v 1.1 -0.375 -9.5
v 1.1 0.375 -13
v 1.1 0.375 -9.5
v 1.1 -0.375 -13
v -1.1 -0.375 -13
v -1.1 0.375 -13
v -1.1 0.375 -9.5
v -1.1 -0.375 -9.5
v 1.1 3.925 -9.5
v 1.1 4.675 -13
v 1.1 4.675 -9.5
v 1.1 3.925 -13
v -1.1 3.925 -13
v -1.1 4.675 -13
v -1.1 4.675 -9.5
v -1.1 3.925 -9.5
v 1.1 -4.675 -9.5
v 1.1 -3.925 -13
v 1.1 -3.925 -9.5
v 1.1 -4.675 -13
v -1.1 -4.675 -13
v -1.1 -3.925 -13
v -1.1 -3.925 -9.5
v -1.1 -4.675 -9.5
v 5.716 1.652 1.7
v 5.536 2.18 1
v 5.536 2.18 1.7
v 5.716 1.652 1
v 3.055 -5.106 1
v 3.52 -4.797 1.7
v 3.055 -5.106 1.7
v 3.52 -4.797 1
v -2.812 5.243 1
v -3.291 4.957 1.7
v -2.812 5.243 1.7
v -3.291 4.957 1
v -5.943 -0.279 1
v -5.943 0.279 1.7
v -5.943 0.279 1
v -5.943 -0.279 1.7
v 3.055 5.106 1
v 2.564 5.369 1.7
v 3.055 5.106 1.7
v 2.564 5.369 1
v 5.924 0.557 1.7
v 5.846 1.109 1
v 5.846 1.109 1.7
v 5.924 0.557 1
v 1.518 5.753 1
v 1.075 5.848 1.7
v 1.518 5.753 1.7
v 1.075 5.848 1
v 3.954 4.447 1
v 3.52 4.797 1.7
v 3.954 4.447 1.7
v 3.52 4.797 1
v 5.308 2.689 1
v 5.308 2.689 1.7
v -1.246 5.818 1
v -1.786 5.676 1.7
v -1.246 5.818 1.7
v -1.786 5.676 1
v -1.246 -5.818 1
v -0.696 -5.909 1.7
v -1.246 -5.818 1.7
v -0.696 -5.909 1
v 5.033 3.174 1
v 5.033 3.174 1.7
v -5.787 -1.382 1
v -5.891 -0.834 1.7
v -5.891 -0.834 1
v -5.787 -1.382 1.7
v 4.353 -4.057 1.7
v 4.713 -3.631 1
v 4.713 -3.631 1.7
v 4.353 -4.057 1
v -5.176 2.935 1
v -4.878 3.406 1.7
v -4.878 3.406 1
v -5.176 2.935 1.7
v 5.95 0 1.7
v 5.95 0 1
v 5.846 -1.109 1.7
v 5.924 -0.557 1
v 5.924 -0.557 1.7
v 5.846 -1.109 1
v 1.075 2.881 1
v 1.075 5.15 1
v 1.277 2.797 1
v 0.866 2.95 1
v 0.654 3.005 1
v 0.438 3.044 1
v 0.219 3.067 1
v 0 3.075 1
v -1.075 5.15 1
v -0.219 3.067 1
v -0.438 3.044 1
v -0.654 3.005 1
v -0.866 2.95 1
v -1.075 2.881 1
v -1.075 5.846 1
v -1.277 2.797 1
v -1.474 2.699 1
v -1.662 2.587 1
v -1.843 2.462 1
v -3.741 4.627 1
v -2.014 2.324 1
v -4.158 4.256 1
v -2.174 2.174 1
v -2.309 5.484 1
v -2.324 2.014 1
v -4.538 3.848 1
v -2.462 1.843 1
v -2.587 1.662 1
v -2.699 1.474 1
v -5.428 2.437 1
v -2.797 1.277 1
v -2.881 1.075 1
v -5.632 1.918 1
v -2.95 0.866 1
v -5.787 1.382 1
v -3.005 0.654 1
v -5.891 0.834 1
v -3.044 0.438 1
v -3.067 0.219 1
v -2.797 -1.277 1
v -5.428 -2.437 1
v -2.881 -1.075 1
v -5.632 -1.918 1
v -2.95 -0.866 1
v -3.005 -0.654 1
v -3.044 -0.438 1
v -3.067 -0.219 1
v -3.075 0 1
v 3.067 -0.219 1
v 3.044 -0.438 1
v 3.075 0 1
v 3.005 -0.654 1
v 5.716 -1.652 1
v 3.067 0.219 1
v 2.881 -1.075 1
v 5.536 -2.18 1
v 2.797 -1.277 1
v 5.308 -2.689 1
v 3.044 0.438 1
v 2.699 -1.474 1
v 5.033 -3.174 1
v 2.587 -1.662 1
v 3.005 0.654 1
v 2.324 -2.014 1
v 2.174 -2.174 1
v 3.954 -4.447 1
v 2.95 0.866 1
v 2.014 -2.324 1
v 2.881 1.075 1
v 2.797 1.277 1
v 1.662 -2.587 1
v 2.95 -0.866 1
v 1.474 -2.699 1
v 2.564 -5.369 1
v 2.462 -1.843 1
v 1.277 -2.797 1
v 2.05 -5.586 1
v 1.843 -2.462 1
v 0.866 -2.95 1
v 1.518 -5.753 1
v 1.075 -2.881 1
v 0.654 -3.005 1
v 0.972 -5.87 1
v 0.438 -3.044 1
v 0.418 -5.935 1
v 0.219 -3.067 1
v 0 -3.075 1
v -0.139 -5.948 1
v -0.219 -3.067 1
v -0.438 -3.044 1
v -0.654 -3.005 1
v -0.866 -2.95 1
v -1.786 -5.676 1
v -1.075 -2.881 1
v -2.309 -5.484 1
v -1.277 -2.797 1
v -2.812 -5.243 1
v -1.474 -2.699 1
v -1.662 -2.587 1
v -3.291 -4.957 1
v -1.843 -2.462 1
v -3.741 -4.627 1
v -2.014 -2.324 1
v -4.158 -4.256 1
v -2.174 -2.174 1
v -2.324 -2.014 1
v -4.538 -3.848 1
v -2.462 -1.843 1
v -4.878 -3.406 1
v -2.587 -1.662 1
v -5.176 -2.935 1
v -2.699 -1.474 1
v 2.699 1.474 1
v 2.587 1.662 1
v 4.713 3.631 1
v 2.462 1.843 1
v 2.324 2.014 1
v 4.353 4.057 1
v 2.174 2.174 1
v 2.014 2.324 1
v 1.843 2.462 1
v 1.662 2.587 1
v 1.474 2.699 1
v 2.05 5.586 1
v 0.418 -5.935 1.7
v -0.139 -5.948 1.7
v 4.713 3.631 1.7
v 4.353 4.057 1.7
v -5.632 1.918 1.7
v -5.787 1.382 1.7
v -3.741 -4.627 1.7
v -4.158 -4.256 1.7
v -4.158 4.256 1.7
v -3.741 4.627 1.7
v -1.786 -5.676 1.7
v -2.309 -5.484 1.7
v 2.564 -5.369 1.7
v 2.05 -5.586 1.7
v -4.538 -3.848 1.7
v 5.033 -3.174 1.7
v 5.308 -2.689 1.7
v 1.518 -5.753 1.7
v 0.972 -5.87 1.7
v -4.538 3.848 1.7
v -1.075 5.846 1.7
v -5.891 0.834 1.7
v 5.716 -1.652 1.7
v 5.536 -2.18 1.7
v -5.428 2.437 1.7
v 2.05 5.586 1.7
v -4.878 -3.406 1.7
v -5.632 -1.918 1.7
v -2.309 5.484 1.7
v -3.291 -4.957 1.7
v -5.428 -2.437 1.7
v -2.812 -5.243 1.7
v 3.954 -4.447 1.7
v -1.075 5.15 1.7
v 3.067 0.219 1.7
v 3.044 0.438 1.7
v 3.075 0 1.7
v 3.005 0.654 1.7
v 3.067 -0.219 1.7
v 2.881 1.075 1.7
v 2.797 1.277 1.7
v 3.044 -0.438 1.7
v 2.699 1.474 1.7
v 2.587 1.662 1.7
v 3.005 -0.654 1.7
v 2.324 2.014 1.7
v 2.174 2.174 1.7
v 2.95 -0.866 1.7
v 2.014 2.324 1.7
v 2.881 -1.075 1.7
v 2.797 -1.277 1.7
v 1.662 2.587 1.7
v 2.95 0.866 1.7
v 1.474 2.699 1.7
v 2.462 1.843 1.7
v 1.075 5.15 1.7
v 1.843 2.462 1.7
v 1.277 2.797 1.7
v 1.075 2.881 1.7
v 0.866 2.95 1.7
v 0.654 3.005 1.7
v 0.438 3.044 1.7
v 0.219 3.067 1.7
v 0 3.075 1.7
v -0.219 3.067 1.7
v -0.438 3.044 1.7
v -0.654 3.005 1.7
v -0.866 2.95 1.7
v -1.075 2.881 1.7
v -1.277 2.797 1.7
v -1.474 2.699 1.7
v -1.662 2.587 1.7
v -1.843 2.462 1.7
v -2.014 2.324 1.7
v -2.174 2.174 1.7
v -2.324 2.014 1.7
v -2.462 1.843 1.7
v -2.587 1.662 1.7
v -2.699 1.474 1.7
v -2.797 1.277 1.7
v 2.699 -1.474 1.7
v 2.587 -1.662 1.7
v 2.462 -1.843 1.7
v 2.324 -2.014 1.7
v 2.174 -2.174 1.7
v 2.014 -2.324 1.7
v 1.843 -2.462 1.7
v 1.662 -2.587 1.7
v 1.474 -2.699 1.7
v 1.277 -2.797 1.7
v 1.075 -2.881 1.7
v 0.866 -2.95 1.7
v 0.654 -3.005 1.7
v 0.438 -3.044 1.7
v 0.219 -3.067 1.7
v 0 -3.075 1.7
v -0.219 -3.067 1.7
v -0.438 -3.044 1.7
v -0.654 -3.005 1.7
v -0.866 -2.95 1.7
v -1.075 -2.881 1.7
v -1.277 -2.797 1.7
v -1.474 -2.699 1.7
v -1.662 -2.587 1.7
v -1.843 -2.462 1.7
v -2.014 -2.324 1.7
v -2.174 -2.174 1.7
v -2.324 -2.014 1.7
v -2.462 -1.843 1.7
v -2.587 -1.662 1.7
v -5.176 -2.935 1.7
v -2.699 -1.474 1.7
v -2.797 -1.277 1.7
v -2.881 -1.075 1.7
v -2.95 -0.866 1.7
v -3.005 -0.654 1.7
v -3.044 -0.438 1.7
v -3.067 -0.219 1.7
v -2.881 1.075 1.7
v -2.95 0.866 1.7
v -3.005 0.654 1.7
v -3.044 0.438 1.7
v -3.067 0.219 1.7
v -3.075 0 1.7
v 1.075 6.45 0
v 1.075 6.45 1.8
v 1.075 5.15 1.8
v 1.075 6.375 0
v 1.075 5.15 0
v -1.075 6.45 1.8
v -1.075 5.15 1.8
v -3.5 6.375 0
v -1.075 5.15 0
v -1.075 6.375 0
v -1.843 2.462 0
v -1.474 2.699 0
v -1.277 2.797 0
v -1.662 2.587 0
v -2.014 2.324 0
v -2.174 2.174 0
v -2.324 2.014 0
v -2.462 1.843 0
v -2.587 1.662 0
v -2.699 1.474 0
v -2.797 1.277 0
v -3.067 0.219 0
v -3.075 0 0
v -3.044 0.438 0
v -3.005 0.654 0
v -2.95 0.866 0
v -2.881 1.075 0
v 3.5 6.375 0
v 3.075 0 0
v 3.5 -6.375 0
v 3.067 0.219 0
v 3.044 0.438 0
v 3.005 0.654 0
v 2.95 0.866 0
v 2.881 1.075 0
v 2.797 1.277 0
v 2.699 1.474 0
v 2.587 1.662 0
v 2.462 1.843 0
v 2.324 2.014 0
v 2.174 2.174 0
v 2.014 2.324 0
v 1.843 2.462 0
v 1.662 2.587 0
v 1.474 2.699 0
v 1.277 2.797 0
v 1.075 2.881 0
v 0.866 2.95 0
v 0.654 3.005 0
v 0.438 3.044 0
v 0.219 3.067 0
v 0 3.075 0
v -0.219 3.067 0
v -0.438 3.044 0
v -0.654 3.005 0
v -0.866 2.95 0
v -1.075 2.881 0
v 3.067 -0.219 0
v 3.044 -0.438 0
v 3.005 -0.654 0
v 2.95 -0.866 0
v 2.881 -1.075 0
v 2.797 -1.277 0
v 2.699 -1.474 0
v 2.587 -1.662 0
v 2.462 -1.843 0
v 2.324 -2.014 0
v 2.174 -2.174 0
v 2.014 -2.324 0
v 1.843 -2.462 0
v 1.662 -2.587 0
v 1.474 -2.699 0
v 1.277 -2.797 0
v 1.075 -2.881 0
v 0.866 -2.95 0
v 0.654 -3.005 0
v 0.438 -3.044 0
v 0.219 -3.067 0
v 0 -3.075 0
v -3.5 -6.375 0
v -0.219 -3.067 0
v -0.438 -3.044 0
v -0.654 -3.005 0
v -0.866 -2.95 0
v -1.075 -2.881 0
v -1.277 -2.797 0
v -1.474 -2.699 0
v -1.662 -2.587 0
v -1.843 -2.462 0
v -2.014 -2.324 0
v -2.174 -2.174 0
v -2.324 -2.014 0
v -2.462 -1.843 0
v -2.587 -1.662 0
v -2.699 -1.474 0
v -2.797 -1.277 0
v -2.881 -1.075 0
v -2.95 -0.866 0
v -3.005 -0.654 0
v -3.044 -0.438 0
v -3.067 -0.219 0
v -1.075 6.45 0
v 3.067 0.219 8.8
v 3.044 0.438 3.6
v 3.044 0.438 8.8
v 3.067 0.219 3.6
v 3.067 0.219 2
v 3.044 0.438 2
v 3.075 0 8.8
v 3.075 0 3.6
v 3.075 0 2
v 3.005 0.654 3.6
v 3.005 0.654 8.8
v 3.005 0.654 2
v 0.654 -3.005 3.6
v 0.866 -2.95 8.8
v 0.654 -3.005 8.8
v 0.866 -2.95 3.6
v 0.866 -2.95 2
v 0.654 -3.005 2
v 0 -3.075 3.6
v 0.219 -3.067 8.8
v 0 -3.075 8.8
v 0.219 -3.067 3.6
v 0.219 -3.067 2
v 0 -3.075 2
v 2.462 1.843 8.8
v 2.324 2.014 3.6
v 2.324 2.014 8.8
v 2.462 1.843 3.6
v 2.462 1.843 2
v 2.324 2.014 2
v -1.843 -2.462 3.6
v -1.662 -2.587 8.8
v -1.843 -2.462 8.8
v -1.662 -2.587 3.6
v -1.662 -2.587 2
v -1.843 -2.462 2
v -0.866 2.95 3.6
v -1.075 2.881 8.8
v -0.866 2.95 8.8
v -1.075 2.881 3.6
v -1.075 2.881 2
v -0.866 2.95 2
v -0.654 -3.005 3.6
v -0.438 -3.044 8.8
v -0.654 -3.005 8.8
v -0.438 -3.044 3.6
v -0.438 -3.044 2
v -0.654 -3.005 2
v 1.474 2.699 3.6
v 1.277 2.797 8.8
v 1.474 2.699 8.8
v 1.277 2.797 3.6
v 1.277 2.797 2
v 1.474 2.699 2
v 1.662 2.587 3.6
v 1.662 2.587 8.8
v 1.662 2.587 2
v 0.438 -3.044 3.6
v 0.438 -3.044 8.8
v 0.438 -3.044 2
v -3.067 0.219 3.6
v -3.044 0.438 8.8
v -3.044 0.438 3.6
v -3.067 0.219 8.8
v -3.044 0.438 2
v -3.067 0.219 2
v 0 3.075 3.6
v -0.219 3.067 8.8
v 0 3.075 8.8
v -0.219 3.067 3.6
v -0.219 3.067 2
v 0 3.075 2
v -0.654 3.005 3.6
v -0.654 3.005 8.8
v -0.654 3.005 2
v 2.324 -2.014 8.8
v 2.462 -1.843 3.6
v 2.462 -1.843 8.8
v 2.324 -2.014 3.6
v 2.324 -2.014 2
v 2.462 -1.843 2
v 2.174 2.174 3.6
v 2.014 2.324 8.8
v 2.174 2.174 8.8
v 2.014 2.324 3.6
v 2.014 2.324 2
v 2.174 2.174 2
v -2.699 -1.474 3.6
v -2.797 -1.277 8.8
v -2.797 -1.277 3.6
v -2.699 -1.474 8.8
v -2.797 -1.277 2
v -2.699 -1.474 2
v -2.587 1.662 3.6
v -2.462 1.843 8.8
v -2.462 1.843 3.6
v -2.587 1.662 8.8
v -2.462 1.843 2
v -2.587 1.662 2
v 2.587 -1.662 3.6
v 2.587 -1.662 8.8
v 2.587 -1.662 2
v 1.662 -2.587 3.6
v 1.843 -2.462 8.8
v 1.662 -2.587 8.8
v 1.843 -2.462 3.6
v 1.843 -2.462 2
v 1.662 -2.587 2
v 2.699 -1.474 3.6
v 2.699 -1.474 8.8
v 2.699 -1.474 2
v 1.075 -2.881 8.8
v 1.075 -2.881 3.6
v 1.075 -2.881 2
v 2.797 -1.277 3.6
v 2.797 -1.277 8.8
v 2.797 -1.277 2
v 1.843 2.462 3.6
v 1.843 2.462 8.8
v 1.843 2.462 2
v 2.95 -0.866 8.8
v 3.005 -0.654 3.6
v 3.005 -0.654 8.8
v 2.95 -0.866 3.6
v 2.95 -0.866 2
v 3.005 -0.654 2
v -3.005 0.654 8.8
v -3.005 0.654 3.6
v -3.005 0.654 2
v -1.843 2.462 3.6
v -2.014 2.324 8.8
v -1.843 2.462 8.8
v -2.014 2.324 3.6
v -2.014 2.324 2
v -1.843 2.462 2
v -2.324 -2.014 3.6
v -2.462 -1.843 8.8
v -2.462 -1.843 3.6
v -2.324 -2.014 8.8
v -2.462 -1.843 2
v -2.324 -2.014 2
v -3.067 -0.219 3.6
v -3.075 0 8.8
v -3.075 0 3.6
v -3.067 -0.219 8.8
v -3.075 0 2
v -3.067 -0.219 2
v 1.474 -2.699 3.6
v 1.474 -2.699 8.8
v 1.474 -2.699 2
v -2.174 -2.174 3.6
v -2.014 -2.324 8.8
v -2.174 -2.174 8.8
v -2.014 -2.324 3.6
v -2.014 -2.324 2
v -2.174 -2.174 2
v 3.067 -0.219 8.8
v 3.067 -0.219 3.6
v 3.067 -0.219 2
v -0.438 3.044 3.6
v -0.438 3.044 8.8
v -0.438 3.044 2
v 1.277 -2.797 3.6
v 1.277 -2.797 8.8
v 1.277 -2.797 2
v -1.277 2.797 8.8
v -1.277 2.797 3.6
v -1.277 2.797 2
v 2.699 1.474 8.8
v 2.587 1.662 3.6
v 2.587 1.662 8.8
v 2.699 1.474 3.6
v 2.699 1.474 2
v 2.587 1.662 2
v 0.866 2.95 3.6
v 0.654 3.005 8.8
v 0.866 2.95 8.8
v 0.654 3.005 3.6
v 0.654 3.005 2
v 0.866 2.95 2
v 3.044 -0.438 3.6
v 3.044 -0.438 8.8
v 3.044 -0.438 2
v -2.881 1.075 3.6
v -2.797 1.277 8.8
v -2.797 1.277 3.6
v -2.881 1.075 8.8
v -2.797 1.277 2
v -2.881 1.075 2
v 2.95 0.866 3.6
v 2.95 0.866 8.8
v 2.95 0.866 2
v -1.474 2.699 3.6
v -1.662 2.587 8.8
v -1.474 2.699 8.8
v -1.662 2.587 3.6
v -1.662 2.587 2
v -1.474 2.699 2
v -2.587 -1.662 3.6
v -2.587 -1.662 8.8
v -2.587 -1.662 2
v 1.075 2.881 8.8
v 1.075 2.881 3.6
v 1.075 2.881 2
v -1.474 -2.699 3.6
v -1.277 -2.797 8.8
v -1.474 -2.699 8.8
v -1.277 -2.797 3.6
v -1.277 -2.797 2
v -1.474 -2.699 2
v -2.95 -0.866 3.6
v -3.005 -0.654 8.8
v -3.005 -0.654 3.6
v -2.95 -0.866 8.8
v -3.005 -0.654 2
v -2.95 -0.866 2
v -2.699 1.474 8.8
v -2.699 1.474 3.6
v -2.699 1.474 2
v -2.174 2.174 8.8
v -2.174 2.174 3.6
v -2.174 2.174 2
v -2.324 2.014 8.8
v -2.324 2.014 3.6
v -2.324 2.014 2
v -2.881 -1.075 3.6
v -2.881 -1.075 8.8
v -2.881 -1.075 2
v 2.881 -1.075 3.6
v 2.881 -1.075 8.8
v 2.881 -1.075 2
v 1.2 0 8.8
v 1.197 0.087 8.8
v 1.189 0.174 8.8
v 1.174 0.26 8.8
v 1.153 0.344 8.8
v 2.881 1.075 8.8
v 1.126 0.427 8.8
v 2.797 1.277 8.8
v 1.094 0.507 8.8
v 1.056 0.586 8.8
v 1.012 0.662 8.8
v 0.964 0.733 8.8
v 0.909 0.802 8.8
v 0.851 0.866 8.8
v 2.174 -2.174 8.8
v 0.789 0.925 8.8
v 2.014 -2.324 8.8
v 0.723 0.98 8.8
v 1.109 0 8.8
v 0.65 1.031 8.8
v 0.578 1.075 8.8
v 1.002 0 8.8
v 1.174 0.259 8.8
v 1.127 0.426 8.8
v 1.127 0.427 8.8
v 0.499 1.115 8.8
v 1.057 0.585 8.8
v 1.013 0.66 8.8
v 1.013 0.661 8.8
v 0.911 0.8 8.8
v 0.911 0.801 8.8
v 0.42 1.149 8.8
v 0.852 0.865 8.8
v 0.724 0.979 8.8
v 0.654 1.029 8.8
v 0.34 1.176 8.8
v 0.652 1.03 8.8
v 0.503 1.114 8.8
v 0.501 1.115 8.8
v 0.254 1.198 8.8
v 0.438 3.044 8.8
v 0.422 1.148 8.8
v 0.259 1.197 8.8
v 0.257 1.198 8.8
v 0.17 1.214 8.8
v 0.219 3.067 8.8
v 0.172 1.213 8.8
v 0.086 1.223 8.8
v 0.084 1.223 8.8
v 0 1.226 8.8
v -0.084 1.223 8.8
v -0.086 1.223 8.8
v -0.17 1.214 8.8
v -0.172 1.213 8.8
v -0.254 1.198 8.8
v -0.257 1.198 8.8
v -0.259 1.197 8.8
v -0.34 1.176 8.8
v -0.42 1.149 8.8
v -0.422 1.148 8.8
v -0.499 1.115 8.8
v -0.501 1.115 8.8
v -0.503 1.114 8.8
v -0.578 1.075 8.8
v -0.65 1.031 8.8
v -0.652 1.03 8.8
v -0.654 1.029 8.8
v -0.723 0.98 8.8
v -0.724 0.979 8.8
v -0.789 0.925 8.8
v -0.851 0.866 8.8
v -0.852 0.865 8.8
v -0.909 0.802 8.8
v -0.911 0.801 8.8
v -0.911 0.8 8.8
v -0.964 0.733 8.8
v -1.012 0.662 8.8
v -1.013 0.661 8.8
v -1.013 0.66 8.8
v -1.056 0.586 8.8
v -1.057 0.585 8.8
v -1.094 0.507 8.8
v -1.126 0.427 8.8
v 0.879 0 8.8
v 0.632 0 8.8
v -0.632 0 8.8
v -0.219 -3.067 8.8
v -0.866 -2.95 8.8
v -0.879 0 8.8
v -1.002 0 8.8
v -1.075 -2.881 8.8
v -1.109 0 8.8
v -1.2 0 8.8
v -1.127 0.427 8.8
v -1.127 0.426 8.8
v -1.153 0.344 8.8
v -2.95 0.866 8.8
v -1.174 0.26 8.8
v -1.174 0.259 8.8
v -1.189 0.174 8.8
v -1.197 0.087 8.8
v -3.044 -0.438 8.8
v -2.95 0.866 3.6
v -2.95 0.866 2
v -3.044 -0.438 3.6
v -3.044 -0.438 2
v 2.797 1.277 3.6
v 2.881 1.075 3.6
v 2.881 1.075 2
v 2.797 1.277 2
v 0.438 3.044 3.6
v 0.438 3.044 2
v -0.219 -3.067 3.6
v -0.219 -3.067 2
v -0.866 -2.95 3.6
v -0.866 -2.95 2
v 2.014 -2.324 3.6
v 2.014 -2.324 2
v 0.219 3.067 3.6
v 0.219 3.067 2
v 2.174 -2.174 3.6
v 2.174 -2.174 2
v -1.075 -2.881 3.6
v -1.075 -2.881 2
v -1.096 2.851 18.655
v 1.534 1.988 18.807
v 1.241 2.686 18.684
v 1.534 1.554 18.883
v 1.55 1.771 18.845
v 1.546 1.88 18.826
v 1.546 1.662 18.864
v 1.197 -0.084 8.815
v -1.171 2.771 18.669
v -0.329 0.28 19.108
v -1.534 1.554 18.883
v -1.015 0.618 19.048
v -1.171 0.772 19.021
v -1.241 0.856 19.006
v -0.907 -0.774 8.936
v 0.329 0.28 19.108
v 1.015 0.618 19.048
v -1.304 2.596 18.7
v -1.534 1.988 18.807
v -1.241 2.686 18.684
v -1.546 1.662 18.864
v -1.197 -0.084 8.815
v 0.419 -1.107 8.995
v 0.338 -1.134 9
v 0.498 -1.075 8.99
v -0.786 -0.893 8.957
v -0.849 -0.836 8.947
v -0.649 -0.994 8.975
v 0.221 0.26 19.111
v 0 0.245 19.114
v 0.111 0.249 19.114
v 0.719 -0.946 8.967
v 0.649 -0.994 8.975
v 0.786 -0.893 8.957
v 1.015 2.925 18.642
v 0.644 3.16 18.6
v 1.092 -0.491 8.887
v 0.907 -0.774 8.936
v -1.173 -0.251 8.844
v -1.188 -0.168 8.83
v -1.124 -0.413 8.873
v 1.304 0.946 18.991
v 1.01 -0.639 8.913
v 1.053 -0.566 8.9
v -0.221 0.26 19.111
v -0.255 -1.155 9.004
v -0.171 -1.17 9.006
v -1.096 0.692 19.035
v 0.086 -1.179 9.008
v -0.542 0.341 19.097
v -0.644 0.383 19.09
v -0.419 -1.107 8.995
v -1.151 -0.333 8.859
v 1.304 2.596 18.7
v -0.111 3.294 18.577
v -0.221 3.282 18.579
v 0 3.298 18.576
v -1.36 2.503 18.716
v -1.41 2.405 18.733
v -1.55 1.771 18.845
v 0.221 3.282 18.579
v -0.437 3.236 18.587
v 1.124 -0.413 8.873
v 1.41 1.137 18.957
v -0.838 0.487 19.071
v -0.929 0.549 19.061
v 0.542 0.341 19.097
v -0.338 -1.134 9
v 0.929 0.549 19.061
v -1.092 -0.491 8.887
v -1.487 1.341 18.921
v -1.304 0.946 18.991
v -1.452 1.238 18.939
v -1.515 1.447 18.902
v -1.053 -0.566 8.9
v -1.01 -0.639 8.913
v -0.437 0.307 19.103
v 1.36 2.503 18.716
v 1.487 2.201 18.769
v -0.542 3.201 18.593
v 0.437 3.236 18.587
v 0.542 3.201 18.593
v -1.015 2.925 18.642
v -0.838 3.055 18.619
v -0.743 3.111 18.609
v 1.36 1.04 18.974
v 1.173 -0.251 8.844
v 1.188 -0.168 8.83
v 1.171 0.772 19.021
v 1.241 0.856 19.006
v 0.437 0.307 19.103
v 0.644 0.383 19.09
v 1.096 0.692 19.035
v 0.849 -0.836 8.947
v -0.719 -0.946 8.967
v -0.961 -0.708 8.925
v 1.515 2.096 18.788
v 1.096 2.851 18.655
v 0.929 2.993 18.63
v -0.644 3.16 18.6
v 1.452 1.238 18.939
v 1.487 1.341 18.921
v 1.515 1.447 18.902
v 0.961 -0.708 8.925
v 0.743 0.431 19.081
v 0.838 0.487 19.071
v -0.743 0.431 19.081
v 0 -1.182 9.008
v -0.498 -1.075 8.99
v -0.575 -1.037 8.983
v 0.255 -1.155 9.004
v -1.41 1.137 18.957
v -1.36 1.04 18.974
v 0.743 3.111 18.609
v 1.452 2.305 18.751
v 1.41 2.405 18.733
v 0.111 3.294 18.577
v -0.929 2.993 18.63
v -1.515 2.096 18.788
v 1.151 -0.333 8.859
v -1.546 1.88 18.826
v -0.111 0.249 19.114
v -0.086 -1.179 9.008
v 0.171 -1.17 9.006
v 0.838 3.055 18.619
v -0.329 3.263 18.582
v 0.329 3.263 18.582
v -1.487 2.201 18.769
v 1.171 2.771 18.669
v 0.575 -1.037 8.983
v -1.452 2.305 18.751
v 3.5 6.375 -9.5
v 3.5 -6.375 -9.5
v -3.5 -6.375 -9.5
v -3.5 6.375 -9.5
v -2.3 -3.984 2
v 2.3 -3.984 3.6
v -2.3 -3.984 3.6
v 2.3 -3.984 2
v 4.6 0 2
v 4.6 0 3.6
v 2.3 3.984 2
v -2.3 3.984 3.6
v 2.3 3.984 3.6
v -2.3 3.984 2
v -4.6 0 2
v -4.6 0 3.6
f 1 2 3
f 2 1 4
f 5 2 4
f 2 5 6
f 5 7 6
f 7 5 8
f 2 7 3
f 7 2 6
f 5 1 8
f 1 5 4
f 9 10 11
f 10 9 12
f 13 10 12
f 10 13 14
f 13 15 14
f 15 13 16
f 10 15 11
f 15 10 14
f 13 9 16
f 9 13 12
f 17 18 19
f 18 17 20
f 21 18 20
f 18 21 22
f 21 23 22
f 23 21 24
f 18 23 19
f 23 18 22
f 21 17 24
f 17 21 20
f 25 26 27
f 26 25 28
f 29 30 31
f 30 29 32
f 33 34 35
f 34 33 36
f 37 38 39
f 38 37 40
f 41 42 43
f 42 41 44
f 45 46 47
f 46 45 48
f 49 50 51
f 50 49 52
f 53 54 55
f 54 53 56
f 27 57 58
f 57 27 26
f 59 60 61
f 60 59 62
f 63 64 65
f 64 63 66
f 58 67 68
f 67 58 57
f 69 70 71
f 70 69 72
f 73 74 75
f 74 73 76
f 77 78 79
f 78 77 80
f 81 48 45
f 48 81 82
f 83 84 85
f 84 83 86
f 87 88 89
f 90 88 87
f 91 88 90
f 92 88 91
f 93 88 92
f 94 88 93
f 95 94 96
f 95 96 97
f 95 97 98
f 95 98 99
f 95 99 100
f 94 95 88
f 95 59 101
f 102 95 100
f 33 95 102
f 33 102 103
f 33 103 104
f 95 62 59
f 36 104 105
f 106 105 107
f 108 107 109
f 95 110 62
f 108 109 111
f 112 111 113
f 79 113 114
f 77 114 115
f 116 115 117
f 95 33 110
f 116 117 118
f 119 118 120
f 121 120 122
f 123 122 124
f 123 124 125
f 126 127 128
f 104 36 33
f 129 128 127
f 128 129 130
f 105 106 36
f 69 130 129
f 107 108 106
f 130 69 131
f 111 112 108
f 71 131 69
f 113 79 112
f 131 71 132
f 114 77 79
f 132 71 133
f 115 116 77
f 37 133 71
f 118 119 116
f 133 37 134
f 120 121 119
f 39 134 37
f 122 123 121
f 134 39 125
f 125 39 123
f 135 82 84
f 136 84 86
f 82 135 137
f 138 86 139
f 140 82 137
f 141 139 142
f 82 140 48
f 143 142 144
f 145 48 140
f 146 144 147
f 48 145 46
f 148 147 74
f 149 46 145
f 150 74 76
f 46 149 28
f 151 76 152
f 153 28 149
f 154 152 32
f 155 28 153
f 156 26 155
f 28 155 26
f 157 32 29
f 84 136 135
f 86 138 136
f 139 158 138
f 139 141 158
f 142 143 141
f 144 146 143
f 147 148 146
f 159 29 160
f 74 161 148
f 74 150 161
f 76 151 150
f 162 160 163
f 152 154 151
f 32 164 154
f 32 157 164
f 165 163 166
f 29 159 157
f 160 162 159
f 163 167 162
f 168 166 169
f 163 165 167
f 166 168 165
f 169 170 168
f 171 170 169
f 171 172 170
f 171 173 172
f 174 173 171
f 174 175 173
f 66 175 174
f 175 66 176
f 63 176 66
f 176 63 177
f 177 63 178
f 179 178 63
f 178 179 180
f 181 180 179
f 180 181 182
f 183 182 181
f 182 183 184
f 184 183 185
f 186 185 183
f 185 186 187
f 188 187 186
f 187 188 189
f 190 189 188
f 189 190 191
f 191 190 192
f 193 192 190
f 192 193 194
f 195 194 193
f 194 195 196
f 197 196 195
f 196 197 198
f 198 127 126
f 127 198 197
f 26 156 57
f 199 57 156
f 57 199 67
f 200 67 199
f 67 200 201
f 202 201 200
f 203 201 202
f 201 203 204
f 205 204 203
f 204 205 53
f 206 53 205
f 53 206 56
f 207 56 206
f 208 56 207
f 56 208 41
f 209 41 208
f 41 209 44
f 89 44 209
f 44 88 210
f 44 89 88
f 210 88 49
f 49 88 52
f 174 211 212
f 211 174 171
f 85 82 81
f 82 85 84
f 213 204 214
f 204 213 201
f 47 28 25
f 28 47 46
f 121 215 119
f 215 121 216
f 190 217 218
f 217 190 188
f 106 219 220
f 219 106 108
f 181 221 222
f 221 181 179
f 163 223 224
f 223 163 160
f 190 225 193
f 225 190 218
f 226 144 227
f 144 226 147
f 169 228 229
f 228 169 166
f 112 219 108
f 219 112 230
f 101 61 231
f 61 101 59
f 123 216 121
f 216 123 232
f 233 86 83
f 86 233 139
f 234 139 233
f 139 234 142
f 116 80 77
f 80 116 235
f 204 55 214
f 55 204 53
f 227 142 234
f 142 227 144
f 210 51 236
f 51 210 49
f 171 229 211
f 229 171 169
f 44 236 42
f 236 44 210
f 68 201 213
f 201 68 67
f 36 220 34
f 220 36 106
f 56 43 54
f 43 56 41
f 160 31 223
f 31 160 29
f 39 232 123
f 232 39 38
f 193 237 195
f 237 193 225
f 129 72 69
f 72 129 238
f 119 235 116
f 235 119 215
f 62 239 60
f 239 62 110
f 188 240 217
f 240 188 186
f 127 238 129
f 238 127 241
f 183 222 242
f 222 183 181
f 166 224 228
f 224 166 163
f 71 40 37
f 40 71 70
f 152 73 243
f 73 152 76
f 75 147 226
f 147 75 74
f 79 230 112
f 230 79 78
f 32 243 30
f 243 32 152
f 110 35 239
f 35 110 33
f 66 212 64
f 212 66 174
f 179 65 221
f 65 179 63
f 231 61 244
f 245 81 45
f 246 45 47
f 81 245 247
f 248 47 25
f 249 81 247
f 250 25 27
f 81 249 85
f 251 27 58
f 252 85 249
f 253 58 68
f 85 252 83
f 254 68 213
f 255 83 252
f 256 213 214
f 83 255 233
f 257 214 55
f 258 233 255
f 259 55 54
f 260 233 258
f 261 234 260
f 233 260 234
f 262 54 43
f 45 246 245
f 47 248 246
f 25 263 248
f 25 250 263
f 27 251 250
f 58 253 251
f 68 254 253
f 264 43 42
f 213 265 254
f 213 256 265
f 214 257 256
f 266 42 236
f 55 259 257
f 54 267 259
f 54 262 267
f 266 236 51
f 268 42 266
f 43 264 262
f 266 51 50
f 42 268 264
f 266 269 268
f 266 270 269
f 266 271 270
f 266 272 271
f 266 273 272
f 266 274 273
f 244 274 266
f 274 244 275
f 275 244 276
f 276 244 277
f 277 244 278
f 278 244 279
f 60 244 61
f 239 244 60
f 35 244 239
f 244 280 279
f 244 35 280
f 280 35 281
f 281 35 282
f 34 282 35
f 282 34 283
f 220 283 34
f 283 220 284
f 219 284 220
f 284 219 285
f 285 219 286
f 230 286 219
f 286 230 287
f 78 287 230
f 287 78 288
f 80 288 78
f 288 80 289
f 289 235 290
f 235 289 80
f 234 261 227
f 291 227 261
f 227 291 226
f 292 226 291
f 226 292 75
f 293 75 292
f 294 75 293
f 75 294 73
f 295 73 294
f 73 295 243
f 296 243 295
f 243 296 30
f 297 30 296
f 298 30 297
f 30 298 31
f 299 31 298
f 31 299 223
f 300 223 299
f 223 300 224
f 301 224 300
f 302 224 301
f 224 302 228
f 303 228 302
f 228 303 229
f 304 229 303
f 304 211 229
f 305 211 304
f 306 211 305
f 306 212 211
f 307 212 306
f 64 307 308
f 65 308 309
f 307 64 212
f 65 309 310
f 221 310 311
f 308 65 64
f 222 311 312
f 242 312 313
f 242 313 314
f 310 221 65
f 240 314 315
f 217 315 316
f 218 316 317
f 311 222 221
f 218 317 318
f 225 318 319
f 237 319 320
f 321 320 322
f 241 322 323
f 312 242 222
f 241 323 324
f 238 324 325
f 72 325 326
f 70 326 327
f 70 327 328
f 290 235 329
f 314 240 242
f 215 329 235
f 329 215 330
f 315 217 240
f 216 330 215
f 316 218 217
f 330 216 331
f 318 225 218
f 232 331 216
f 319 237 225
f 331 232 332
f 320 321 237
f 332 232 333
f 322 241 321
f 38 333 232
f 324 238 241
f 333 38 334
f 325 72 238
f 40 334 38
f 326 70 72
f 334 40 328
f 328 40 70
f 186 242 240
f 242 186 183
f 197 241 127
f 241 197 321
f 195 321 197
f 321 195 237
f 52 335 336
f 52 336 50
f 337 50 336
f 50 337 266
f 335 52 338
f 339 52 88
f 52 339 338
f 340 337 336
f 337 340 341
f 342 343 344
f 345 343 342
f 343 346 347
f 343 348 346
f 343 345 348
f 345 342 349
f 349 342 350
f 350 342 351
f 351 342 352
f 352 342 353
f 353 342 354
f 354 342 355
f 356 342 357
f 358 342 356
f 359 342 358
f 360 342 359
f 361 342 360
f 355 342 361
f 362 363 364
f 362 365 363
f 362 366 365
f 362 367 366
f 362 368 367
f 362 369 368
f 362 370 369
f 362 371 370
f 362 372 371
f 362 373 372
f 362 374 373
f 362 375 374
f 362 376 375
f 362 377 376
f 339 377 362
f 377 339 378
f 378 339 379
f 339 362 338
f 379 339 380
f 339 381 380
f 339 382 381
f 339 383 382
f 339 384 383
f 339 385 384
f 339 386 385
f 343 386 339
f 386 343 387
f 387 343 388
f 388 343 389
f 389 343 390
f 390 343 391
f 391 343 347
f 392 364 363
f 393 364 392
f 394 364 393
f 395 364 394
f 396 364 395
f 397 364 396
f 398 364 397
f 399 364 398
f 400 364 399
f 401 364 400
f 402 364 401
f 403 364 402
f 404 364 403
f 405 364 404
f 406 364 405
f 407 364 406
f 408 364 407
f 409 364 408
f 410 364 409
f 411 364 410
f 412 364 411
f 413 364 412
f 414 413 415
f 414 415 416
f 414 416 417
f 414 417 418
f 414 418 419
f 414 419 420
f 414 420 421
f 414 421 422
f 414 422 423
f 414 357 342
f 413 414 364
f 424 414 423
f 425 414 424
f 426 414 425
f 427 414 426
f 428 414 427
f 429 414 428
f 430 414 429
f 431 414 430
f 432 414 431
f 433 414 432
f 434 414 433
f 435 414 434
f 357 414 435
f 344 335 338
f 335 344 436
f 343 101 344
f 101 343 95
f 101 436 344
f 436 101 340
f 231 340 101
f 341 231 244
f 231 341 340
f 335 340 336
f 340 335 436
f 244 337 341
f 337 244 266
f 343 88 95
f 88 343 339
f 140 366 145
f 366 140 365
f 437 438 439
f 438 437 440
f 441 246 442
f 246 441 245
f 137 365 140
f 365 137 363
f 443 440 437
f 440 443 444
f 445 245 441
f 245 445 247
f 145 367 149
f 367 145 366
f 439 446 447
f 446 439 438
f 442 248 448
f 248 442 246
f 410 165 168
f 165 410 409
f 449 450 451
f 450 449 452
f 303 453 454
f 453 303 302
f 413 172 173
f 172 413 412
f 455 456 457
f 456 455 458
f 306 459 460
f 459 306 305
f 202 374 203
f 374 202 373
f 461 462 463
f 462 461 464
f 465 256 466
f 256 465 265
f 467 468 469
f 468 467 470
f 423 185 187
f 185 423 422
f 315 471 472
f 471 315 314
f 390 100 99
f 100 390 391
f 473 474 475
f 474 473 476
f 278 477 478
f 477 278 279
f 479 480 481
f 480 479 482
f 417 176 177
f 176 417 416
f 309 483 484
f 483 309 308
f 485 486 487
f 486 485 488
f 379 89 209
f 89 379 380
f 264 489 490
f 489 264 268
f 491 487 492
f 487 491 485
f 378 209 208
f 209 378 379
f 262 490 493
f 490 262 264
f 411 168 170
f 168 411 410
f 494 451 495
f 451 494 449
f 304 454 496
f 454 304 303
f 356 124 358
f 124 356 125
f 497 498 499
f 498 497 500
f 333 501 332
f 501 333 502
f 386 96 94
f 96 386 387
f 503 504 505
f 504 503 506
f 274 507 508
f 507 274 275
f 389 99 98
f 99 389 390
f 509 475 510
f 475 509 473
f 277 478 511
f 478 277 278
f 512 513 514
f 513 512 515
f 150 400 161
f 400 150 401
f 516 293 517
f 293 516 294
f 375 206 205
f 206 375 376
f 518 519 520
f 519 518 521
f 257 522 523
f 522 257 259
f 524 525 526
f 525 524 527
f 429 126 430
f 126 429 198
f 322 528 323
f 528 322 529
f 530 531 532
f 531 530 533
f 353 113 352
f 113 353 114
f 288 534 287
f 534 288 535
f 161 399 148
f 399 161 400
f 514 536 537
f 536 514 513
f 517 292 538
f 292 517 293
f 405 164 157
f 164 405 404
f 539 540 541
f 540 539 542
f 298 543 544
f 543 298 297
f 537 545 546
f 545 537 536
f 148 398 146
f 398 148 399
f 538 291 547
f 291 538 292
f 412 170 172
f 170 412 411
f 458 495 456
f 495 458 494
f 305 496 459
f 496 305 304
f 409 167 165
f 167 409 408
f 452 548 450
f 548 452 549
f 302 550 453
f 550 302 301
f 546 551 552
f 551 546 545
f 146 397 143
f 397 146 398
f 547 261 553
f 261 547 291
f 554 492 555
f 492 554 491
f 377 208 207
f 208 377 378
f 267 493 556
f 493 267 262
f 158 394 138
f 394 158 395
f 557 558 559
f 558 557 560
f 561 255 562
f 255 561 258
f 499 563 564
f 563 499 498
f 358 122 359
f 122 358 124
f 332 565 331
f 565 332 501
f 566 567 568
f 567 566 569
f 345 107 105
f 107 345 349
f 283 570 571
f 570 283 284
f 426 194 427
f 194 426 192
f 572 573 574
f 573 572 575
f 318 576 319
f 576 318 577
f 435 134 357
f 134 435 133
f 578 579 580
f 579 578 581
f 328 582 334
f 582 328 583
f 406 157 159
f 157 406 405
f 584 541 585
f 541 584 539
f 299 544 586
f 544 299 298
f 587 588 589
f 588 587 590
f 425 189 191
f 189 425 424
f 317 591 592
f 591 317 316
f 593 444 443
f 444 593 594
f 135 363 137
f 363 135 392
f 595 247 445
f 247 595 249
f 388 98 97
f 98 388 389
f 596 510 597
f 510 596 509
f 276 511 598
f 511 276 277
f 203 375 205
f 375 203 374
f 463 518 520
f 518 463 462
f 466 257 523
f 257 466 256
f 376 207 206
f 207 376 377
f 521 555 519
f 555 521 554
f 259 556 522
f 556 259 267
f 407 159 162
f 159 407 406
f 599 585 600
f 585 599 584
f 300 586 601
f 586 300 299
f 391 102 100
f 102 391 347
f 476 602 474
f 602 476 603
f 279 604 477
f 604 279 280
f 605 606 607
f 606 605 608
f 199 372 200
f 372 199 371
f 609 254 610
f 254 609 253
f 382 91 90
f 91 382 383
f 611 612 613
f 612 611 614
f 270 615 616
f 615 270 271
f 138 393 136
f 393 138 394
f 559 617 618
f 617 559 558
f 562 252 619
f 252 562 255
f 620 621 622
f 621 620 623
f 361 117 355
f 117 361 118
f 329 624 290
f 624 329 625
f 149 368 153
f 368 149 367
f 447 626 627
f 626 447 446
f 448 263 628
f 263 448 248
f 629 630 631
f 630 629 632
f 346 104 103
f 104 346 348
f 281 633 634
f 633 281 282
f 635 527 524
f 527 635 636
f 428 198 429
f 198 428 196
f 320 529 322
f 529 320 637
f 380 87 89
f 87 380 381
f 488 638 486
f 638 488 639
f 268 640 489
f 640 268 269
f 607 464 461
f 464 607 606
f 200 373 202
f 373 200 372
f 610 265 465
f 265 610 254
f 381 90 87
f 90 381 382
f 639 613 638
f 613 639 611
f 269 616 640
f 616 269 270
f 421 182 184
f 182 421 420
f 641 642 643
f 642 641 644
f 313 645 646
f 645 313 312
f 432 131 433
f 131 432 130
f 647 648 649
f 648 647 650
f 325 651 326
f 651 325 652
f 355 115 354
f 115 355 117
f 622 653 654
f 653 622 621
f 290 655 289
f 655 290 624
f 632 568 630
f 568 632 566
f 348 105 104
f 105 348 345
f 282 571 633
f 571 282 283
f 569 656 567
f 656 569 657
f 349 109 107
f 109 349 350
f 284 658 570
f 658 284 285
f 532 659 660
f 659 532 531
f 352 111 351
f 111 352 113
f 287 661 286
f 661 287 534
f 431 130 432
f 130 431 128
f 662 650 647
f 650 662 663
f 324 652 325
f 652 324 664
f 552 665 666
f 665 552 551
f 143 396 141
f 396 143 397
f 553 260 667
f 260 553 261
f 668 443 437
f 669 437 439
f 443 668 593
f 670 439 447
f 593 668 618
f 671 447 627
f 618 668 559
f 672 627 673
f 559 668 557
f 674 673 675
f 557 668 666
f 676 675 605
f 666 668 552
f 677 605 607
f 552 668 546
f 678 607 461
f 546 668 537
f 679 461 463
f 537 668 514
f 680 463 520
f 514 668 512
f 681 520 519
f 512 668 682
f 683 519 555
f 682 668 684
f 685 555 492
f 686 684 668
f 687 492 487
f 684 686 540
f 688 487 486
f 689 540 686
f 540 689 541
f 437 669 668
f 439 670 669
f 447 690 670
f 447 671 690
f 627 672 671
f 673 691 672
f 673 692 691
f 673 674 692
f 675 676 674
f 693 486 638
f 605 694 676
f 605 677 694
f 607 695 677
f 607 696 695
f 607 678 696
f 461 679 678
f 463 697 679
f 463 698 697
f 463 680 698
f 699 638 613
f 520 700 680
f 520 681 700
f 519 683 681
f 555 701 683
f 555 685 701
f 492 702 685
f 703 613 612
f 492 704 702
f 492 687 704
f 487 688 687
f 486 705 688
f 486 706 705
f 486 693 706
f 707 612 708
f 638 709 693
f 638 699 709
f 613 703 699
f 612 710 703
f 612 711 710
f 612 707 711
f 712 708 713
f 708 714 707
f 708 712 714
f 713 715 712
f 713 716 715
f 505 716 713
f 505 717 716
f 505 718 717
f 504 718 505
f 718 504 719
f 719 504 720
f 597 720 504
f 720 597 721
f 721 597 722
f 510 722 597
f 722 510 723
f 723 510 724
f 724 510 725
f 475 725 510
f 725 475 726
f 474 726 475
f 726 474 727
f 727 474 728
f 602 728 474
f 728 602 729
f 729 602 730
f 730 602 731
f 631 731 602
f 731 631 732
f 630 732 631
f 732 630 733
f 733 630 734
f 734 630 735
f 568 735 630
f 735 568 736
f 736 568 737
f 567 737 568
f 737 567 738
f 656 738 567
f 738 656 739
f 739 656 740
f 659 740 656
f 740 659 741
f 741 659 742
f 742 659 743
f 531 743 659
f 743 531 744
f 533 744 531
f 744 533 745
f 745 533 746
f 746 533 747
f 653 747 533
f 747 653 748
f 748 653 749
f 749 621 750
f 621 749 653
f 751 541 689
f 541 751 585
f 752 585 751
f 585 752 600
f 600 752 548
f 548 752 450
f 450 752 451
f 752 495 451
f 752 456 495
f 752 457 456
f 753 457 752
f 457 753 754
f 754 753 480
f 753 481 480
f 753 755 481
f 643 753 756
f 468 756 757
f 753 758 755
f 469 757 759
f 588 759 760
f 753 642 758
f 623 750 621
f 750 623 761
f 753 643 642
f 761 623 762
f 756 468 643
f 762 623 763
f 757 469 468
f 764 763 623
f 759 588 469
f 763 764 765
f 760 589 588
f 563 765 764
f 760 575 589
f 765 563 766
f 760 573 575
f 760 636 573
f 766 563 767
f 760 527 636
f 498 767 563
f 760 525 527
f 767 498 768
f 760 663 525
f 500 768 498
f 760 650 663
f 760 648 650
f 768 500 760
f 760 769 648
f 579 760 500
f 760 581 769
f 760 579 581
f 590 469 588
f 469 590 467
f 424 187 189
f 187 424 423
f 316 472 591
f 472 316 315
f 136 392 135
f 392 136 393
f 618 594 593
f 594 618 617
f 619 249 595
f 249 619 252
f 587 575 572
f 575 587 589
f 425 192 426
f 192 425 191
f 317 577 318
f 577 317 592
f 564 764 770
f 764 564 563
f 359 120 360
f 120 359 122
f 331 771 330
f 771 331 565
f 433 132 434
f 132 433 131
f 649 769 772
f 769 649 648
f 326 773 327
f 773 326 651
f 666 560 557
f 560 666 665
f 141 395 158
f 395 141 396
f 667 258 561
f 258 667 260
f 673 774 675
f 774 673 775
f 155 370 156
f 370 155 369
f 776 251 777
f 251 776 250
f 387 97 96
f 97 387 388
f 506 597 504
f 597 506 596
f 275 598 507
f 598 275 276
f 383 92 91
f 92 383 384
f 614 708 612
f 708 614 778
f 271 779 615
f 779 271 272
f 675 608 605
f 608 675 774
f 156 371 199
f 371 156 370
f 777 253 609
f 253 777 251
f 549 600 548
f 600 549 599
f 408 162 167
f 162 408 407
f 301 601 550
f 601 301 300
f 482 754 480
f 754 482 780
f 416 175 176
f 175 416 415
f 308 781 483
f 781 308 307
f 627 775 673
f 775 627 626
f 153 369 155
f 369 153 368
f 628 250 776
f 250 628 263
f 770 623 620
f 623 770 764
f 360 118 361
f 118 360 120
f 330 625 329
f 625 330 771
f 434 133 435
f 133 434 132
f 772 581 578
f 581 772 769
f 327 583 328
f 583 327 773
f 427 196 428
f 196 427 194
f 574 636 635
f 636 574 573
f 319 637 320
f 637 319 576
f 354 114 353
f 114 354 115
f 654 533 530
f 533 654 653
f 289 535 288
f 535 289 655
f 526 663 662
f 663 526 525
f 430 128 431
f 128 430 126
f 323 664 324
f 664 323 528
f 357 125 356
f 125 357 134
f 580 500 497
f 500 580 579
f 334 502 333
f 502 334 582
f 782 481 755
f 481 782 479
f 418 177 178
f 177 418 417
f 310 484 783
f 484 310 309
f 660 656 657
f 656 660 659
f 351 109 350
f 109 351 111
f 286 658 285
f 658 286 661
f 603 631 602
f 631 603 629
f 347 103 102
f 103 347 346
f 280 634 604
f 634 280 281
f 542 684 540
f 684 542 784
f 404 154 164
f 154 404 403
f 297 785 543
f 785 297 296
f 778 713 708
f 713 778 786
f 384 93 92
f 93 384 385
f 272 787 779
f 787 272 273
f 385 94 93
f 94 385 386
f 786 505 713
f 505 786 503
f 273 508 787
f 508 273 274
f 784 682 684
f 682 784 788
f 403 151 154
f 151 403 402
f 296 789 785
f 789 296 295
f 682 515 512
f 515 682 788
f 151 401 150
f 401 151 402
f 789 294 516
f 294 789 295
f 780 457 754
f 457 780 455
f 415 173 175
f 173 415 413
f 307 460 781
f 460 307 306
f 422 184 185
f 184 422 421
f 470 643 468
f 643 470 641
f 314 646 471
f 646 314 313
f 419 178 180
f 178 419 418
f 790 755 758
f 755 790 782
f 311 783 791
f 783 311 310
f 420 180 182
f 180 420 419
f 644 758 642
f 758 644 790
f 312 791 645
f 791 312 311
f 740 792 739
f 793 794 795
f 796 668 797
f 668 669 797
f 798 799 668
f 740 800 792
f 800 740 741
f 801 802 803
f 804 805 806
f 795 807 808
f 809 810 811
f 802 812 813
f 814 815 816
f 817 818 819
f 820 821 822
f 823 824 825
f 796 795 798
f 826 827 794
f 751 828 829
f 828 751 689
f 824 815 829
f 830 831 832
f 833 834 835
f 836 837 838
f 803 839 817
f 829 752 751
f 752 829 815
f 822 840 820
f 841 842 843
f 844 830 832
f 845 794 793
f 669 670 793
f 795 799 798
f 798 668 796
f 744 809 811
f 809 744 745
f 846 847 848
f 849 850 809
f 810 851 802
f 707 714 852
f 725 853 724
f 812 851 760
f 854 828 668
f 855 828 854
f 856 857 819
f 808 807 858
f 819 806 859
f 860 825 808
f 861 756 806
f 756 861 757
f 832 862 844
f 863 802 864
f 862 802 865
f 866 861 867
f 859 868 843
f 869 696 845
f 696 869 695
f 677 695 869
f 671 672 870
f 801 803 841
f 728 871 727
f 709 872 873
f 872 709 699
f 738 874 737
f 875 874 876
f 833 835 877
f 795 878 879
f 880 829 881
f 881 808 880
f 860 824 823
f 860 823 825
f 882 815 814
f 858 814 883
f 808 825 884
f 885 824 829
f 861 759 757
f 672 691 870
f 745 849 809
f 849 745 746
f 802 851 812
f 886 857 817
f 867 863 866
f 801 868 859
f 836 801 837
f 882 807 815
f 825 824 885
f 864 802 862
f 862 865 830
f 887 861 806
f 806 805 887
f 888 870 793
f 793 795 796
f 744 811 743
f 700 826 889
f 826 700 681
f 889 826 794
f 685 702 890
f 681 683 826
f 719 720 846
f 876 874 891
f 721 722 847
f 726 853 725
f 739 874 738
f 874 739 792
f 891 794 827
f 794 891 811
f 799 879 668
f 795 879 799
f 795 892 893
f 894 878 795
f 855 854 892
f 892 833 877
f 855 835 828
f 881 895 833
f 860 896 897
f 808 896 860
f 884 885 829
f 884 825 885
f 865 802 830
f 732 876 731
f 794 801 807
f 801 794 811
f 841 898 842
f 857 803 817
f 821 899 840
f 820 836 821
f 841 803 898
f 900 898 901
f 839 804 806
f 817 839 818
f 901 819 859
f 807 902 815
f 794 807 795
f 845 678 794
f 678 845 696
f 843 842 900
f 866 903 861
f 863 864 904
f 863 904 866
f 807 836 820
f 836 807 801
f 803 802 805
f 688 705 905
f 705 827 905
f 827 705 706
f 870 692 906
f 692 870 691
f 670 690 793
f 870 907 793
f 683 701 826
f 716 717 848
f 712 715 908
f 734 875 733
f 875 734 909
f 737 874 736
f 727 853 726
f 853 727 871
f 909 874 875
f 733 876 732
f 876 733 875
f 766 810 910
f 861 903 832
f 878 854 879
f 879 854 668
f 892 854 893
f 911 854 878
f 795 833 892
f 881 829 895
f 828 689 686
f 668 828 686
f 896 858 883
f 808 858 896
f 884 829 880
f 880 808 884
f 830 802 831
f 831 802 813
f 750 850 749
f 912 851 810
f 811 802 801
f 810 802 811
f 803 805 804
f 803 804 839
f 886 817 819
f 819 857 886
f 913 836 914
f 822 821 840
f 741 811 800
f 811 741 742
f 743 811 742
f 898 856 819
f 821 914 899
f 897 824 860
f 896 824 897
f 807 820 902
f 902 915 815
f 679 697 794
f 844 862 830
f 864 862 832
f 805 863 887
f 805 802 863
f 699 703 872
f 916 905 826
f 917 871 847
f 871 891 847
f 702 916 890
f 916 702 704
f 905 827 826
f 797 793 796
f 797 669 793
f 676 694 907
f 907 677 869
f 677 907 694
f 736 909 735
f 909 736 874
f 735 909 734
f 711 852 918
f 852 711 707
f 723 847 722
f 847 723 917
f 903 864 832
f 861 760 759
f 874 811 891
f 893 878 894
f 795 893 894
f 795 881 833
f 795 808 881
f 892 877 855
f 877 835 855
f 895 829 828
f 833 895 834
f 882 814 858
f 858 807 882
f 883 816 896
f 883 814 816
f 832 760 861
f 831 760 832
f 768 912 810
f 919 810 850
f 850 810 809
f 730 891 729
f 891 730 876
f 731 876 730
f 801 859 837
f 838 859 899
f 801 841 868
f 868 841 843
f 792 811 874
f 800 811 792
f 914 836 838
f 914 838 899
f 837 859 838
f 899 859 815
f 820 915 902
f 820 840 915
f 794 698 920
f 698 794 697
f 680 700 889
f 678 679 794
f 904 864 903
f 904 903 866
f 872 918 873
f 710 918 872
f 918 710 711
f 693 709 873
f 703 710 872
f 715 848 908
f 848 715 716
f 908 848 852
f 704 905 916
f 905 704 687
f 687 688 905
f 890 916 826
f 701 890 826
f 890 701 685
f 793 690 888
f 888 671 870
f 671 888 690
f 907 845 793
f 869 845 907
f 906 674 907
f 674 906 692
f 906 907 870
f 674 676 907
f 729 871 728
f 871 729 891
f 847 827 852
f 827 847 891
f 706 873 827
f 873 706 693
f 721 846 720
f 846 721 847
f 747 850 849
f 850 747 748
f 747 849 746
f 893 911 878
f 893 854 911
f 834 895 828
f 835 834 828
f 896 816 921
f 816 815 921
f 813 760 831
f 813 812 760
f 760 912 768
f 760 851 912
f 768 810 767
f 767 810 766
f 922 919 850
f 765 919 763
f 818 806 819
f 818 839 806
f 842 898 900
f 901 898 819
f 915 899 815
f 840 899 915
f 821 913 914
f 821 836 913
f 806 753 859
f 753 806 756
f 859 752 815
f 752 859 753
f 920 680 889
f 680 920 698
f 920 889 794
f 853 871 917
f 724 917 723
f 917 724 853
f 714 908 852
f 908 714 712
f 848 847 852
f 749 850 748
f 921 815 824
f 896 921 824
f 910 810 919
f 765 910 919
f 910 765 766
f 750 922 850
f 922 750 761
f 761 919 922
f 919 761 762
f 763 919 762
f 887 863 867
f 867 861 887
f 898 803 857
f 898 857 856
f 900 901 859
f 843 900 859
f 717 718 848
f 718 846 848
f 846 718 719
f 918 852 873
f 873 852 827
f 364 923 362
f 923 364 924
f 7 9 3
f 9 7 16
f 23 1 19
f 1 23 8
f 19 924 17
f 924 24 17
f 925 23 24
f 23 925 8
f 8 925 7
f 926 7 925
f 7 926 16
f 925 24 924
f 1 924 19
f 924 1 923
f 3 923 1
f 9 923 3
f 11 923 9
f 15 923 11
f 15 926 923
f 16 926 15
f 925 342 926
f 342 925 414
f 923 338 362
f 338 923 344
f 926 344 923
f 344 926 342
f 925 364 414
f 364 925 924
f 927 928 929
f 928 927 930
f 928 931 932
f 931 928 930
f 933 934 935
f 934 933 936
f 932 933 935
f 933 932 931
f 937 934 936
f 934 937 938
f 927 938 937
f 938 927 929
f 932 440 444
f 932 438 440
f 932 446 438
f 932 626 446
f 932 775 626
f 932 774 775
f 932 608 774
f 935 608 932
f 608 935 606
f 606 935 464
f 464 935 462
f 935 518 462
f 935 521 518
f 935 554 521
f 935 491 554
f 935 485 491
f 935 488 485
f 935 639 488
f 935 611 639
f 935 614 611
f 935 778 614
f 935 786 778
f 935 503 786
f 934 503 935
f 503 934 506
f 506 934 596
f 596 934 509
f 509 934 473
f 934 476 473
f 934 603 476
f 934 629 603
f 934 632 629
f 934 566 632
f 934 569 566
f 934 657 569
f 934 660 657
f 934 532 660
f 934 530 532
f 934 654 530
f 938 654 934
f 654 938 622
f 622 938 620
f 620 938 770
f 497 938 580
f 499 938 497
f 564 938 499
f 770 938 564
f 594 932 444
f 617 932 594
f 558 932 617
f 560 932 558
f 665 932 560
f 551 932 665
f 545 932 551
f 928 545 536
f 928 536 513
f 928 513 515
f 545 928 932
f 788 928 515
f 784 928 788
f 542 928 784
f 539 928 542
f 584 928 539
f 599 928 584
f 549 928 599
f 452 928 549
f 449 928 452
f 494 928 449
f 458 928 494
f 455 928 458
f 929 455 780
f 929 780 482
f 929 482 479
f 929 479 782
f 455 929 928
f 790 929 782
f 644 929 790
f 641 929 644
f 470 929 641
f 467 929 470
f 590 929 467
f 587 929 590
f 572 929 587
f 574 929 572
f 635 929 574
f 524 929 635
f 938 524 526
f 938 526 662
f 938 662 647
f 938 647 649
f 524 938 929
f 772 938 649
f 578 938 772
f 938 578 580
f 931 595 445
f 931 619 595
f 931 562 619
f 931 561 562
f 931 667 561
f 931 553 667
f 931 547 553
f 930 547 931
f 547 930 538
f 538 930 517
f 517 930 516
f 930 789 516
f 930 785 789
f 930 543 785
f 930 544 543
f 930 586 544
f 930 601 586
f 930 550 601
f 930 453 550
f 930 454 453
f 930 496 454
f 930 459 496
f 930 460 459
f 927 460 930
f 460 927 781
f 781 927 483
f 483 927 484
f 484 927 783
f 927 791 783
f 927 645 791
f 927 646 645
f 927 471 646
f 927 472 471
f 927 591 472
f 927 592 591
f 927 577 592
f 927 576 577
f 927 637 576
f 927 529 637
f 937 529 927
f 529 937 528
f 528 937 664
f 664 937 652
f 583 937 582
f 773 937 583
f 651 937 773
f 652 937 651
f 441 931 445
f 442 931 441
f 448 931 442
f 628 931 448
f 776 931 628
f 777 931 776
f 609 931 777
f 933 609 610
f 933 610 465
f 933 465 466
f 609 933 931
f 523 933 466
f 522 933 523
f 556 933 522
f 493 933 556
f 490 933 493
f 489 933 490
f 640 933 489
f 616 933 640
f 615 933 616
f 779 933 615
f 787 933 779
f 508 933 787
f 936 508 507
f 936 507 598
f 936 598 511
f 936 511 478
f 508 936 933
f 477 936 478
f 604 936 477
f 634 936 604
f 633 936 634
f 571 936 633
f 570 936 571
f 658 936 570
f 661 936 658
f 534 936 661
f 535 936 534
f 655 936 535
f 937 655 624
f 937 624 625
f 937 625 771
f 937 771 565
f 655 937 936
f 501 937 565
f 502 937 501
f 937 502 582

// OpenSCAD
//=================================================================================
// switch3.scad
// Model for metal toggle switches on globes and bike
//
// Dr Tom Flint, 26 Dec 2021
//=================================================================================

//-------------------------------------------------------
module switch3(pos=1,nut=0,washer=0){

  // stack
  cylinder(r=6.15/2,h=8.8,$fn=88);
  translate([0,0,8.8])
  rotate([10*pos,0,0])
  cylinder(r1=2.4/2,r2=3.1/2,h=10.2,$fn=88);

  // body
  translate([0,0,-9.5/2])
  cube([7,12.75,9.5],center=true);

  // wiring tabs
  color("red")
  translate([0,0,-13]){
    translate([0,0,4/2])
    cube([2.2,0.75,4],center=true);
    translate([0,4.3,4/2])
    cube([2.2,0.75,4],center=true);
    translate([0,-4.3,4/2])
    cube([2.2,0.75,4],center=true);
    
  }

  if(nut>0){
    translate([0,0,nut])
    cylinder(r=9.2/2,h=1.6,$fn=6);
  }
  if(washer>0){
    translate([0,0,washer]){
      cylinder(r=11.9/2,h=0.7,$fn=67);
      translate([0,5.8,-.1])
      cube([2.15,1.3,1.8],center=true);
    }
  }

}

//==================================================================================


switch3(pos=-1,nut=2,washer=1);


//==================================================================================
